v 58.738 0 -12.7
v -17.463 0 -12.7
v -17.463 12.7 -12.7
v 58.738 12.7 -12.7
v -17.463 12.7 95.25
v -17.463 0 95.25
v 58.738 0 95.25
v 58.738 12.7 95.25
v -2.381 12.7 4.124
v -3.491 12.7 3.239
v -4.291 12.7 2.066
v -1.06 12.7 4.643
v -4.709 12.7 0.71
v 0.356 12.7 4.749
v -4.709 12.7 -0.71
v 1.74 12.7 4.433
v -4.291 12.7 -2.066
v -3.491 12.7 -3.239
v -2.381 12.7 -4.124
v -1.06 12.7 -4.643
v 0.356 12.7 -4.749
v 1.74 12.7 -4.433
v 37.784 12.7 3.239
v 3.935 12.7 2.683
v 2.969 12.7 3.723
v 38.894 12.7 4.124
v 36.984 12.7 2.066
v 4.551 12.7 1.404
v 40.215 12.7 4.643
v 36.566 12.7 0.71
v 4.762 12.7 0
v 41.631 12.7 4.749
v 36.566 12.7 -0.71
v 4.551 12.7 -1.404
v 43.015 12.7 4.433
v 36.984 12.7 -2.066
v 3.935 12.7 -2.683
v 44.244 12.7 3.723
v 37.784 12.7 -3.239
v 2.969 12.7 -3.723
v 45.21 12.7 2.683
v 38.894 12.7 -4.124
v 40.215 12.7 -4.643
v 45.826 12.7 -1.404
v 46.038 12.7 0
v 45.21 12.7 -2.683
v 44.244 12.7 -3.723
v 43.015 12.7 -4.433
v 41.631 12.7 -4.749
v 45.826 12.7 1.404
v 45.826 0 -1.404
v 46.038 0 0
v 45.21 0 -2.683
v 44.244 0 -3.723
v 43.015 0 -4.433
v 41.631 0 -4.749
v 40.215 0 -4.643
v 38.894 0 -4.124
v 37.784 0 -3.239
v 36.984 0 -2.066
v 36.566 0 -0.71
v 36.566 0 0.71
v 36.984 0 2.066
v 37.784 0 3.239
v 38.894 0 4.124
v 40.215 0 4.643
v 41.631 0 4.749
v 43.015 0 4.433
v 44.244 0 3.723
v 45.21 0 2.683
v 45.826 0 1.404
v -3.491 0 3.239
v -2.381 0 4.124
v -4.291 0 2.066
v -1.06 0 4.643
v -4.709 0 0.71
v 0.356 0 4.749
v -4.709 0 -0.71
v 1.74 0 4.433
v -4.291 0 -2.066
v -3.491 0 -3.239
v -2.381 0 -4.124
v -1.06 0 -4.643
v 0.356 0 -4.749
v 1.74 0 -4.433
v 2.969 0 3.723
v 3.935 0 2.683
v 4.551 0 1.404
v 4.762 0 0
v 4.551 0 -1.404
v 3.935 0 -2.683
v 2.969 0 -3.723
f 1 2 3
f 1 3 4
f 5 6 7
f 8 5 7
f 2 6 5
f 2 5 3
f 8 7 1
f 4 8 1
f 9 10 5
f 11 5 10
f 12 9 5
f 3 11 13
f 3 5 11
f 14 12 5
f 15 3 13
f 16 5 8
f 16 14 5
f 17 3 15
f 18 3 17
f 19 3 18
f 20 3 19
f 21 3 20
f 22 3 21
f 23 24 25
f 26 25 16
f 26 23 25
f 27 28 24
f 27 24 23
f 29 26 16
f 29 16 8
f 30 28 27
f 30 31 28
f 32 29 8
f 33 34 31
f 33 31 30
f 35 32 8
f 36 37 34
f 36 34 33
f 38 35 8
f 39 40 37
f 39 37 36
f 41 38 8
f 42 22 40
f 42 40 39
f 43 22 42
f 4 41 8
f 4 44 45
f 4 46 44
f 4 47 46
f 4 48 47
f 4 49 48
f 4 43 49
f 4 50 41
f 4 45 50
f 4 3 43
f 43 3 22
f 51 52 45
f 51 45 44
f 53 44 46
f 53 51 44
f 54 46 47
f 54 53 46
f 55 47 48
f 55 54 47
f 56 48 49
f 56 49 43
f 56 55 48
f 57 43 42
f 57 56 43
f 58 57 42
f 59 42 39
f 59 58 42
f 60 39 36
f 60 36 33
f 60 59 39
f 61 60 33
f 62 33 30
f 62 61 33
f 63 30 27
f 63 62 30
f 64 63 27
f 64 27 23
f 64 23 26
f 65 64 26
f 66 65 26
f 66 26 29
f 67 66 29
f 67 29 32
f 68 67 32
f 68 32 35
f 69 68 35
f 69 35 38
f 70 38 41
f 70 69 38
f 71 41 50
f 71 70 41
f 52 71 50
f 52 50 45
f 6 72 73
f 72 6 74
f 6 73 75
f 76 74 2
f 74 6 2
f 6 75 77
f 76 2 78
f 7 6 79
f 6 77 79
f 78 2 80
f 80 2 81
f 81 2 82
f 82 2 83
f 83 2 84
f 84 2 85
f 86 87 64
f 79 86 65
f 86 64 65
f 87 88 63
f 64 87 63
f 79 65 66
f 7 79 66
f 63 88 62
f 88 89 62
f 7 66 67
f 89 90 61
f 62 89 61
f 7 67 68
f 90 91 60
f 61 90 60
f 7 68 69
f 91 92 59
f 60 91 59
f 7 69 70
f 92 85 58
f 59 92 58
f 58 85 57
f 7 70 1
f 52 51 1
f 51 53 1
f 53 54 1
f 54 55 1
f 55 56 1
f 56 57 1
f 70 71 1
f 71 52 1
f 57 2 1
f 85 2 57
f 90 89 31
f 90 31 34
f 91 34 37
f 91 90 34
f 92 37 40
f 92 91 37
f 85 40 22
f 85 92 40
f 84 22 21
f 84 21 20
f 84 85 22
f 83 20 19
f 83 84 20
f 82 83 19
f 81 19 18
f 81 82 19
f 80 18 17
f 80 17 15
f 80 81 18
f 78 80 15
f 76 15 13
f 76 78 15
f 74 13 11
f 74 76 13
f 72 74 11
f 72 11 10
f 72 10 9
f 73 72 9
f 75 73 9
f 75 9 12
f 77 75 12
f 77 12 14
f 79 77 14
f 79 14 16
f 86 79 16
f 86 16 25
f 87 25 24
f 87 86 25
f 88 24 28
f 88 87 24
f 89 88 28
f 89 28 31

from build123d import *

# Parameters (mm, degrees)
SKETCH1_W           = 76.2
SKETCH1_H           = 107.95
SKETCH1_R           = 4.7625
BOSS_EXTRUDE1_DEPTH = 12.7


with BuildPart() as part:
    # Sketch1 → Boss-Extrude1 (new body)
    with BuildSketch(Plane(origin=(0, 0, 0), x_dir=(1, 0, 0), z_dir=(0, 1, 0))):
        with Locations((20.6375, -41.275)):
            Rectangle(SKETCH1_W, SKETCH1_H)
        Circle(SKETCH1_R, mode=Mode.SUBTRACT)
        with Locations((41.275, 0)):
            Circle(SKETCH1_R, mode=Mode.SUBTRACT)
    extrude(amount=BOSS_EXTRUDE1_DEPTH)


solid = part.part
